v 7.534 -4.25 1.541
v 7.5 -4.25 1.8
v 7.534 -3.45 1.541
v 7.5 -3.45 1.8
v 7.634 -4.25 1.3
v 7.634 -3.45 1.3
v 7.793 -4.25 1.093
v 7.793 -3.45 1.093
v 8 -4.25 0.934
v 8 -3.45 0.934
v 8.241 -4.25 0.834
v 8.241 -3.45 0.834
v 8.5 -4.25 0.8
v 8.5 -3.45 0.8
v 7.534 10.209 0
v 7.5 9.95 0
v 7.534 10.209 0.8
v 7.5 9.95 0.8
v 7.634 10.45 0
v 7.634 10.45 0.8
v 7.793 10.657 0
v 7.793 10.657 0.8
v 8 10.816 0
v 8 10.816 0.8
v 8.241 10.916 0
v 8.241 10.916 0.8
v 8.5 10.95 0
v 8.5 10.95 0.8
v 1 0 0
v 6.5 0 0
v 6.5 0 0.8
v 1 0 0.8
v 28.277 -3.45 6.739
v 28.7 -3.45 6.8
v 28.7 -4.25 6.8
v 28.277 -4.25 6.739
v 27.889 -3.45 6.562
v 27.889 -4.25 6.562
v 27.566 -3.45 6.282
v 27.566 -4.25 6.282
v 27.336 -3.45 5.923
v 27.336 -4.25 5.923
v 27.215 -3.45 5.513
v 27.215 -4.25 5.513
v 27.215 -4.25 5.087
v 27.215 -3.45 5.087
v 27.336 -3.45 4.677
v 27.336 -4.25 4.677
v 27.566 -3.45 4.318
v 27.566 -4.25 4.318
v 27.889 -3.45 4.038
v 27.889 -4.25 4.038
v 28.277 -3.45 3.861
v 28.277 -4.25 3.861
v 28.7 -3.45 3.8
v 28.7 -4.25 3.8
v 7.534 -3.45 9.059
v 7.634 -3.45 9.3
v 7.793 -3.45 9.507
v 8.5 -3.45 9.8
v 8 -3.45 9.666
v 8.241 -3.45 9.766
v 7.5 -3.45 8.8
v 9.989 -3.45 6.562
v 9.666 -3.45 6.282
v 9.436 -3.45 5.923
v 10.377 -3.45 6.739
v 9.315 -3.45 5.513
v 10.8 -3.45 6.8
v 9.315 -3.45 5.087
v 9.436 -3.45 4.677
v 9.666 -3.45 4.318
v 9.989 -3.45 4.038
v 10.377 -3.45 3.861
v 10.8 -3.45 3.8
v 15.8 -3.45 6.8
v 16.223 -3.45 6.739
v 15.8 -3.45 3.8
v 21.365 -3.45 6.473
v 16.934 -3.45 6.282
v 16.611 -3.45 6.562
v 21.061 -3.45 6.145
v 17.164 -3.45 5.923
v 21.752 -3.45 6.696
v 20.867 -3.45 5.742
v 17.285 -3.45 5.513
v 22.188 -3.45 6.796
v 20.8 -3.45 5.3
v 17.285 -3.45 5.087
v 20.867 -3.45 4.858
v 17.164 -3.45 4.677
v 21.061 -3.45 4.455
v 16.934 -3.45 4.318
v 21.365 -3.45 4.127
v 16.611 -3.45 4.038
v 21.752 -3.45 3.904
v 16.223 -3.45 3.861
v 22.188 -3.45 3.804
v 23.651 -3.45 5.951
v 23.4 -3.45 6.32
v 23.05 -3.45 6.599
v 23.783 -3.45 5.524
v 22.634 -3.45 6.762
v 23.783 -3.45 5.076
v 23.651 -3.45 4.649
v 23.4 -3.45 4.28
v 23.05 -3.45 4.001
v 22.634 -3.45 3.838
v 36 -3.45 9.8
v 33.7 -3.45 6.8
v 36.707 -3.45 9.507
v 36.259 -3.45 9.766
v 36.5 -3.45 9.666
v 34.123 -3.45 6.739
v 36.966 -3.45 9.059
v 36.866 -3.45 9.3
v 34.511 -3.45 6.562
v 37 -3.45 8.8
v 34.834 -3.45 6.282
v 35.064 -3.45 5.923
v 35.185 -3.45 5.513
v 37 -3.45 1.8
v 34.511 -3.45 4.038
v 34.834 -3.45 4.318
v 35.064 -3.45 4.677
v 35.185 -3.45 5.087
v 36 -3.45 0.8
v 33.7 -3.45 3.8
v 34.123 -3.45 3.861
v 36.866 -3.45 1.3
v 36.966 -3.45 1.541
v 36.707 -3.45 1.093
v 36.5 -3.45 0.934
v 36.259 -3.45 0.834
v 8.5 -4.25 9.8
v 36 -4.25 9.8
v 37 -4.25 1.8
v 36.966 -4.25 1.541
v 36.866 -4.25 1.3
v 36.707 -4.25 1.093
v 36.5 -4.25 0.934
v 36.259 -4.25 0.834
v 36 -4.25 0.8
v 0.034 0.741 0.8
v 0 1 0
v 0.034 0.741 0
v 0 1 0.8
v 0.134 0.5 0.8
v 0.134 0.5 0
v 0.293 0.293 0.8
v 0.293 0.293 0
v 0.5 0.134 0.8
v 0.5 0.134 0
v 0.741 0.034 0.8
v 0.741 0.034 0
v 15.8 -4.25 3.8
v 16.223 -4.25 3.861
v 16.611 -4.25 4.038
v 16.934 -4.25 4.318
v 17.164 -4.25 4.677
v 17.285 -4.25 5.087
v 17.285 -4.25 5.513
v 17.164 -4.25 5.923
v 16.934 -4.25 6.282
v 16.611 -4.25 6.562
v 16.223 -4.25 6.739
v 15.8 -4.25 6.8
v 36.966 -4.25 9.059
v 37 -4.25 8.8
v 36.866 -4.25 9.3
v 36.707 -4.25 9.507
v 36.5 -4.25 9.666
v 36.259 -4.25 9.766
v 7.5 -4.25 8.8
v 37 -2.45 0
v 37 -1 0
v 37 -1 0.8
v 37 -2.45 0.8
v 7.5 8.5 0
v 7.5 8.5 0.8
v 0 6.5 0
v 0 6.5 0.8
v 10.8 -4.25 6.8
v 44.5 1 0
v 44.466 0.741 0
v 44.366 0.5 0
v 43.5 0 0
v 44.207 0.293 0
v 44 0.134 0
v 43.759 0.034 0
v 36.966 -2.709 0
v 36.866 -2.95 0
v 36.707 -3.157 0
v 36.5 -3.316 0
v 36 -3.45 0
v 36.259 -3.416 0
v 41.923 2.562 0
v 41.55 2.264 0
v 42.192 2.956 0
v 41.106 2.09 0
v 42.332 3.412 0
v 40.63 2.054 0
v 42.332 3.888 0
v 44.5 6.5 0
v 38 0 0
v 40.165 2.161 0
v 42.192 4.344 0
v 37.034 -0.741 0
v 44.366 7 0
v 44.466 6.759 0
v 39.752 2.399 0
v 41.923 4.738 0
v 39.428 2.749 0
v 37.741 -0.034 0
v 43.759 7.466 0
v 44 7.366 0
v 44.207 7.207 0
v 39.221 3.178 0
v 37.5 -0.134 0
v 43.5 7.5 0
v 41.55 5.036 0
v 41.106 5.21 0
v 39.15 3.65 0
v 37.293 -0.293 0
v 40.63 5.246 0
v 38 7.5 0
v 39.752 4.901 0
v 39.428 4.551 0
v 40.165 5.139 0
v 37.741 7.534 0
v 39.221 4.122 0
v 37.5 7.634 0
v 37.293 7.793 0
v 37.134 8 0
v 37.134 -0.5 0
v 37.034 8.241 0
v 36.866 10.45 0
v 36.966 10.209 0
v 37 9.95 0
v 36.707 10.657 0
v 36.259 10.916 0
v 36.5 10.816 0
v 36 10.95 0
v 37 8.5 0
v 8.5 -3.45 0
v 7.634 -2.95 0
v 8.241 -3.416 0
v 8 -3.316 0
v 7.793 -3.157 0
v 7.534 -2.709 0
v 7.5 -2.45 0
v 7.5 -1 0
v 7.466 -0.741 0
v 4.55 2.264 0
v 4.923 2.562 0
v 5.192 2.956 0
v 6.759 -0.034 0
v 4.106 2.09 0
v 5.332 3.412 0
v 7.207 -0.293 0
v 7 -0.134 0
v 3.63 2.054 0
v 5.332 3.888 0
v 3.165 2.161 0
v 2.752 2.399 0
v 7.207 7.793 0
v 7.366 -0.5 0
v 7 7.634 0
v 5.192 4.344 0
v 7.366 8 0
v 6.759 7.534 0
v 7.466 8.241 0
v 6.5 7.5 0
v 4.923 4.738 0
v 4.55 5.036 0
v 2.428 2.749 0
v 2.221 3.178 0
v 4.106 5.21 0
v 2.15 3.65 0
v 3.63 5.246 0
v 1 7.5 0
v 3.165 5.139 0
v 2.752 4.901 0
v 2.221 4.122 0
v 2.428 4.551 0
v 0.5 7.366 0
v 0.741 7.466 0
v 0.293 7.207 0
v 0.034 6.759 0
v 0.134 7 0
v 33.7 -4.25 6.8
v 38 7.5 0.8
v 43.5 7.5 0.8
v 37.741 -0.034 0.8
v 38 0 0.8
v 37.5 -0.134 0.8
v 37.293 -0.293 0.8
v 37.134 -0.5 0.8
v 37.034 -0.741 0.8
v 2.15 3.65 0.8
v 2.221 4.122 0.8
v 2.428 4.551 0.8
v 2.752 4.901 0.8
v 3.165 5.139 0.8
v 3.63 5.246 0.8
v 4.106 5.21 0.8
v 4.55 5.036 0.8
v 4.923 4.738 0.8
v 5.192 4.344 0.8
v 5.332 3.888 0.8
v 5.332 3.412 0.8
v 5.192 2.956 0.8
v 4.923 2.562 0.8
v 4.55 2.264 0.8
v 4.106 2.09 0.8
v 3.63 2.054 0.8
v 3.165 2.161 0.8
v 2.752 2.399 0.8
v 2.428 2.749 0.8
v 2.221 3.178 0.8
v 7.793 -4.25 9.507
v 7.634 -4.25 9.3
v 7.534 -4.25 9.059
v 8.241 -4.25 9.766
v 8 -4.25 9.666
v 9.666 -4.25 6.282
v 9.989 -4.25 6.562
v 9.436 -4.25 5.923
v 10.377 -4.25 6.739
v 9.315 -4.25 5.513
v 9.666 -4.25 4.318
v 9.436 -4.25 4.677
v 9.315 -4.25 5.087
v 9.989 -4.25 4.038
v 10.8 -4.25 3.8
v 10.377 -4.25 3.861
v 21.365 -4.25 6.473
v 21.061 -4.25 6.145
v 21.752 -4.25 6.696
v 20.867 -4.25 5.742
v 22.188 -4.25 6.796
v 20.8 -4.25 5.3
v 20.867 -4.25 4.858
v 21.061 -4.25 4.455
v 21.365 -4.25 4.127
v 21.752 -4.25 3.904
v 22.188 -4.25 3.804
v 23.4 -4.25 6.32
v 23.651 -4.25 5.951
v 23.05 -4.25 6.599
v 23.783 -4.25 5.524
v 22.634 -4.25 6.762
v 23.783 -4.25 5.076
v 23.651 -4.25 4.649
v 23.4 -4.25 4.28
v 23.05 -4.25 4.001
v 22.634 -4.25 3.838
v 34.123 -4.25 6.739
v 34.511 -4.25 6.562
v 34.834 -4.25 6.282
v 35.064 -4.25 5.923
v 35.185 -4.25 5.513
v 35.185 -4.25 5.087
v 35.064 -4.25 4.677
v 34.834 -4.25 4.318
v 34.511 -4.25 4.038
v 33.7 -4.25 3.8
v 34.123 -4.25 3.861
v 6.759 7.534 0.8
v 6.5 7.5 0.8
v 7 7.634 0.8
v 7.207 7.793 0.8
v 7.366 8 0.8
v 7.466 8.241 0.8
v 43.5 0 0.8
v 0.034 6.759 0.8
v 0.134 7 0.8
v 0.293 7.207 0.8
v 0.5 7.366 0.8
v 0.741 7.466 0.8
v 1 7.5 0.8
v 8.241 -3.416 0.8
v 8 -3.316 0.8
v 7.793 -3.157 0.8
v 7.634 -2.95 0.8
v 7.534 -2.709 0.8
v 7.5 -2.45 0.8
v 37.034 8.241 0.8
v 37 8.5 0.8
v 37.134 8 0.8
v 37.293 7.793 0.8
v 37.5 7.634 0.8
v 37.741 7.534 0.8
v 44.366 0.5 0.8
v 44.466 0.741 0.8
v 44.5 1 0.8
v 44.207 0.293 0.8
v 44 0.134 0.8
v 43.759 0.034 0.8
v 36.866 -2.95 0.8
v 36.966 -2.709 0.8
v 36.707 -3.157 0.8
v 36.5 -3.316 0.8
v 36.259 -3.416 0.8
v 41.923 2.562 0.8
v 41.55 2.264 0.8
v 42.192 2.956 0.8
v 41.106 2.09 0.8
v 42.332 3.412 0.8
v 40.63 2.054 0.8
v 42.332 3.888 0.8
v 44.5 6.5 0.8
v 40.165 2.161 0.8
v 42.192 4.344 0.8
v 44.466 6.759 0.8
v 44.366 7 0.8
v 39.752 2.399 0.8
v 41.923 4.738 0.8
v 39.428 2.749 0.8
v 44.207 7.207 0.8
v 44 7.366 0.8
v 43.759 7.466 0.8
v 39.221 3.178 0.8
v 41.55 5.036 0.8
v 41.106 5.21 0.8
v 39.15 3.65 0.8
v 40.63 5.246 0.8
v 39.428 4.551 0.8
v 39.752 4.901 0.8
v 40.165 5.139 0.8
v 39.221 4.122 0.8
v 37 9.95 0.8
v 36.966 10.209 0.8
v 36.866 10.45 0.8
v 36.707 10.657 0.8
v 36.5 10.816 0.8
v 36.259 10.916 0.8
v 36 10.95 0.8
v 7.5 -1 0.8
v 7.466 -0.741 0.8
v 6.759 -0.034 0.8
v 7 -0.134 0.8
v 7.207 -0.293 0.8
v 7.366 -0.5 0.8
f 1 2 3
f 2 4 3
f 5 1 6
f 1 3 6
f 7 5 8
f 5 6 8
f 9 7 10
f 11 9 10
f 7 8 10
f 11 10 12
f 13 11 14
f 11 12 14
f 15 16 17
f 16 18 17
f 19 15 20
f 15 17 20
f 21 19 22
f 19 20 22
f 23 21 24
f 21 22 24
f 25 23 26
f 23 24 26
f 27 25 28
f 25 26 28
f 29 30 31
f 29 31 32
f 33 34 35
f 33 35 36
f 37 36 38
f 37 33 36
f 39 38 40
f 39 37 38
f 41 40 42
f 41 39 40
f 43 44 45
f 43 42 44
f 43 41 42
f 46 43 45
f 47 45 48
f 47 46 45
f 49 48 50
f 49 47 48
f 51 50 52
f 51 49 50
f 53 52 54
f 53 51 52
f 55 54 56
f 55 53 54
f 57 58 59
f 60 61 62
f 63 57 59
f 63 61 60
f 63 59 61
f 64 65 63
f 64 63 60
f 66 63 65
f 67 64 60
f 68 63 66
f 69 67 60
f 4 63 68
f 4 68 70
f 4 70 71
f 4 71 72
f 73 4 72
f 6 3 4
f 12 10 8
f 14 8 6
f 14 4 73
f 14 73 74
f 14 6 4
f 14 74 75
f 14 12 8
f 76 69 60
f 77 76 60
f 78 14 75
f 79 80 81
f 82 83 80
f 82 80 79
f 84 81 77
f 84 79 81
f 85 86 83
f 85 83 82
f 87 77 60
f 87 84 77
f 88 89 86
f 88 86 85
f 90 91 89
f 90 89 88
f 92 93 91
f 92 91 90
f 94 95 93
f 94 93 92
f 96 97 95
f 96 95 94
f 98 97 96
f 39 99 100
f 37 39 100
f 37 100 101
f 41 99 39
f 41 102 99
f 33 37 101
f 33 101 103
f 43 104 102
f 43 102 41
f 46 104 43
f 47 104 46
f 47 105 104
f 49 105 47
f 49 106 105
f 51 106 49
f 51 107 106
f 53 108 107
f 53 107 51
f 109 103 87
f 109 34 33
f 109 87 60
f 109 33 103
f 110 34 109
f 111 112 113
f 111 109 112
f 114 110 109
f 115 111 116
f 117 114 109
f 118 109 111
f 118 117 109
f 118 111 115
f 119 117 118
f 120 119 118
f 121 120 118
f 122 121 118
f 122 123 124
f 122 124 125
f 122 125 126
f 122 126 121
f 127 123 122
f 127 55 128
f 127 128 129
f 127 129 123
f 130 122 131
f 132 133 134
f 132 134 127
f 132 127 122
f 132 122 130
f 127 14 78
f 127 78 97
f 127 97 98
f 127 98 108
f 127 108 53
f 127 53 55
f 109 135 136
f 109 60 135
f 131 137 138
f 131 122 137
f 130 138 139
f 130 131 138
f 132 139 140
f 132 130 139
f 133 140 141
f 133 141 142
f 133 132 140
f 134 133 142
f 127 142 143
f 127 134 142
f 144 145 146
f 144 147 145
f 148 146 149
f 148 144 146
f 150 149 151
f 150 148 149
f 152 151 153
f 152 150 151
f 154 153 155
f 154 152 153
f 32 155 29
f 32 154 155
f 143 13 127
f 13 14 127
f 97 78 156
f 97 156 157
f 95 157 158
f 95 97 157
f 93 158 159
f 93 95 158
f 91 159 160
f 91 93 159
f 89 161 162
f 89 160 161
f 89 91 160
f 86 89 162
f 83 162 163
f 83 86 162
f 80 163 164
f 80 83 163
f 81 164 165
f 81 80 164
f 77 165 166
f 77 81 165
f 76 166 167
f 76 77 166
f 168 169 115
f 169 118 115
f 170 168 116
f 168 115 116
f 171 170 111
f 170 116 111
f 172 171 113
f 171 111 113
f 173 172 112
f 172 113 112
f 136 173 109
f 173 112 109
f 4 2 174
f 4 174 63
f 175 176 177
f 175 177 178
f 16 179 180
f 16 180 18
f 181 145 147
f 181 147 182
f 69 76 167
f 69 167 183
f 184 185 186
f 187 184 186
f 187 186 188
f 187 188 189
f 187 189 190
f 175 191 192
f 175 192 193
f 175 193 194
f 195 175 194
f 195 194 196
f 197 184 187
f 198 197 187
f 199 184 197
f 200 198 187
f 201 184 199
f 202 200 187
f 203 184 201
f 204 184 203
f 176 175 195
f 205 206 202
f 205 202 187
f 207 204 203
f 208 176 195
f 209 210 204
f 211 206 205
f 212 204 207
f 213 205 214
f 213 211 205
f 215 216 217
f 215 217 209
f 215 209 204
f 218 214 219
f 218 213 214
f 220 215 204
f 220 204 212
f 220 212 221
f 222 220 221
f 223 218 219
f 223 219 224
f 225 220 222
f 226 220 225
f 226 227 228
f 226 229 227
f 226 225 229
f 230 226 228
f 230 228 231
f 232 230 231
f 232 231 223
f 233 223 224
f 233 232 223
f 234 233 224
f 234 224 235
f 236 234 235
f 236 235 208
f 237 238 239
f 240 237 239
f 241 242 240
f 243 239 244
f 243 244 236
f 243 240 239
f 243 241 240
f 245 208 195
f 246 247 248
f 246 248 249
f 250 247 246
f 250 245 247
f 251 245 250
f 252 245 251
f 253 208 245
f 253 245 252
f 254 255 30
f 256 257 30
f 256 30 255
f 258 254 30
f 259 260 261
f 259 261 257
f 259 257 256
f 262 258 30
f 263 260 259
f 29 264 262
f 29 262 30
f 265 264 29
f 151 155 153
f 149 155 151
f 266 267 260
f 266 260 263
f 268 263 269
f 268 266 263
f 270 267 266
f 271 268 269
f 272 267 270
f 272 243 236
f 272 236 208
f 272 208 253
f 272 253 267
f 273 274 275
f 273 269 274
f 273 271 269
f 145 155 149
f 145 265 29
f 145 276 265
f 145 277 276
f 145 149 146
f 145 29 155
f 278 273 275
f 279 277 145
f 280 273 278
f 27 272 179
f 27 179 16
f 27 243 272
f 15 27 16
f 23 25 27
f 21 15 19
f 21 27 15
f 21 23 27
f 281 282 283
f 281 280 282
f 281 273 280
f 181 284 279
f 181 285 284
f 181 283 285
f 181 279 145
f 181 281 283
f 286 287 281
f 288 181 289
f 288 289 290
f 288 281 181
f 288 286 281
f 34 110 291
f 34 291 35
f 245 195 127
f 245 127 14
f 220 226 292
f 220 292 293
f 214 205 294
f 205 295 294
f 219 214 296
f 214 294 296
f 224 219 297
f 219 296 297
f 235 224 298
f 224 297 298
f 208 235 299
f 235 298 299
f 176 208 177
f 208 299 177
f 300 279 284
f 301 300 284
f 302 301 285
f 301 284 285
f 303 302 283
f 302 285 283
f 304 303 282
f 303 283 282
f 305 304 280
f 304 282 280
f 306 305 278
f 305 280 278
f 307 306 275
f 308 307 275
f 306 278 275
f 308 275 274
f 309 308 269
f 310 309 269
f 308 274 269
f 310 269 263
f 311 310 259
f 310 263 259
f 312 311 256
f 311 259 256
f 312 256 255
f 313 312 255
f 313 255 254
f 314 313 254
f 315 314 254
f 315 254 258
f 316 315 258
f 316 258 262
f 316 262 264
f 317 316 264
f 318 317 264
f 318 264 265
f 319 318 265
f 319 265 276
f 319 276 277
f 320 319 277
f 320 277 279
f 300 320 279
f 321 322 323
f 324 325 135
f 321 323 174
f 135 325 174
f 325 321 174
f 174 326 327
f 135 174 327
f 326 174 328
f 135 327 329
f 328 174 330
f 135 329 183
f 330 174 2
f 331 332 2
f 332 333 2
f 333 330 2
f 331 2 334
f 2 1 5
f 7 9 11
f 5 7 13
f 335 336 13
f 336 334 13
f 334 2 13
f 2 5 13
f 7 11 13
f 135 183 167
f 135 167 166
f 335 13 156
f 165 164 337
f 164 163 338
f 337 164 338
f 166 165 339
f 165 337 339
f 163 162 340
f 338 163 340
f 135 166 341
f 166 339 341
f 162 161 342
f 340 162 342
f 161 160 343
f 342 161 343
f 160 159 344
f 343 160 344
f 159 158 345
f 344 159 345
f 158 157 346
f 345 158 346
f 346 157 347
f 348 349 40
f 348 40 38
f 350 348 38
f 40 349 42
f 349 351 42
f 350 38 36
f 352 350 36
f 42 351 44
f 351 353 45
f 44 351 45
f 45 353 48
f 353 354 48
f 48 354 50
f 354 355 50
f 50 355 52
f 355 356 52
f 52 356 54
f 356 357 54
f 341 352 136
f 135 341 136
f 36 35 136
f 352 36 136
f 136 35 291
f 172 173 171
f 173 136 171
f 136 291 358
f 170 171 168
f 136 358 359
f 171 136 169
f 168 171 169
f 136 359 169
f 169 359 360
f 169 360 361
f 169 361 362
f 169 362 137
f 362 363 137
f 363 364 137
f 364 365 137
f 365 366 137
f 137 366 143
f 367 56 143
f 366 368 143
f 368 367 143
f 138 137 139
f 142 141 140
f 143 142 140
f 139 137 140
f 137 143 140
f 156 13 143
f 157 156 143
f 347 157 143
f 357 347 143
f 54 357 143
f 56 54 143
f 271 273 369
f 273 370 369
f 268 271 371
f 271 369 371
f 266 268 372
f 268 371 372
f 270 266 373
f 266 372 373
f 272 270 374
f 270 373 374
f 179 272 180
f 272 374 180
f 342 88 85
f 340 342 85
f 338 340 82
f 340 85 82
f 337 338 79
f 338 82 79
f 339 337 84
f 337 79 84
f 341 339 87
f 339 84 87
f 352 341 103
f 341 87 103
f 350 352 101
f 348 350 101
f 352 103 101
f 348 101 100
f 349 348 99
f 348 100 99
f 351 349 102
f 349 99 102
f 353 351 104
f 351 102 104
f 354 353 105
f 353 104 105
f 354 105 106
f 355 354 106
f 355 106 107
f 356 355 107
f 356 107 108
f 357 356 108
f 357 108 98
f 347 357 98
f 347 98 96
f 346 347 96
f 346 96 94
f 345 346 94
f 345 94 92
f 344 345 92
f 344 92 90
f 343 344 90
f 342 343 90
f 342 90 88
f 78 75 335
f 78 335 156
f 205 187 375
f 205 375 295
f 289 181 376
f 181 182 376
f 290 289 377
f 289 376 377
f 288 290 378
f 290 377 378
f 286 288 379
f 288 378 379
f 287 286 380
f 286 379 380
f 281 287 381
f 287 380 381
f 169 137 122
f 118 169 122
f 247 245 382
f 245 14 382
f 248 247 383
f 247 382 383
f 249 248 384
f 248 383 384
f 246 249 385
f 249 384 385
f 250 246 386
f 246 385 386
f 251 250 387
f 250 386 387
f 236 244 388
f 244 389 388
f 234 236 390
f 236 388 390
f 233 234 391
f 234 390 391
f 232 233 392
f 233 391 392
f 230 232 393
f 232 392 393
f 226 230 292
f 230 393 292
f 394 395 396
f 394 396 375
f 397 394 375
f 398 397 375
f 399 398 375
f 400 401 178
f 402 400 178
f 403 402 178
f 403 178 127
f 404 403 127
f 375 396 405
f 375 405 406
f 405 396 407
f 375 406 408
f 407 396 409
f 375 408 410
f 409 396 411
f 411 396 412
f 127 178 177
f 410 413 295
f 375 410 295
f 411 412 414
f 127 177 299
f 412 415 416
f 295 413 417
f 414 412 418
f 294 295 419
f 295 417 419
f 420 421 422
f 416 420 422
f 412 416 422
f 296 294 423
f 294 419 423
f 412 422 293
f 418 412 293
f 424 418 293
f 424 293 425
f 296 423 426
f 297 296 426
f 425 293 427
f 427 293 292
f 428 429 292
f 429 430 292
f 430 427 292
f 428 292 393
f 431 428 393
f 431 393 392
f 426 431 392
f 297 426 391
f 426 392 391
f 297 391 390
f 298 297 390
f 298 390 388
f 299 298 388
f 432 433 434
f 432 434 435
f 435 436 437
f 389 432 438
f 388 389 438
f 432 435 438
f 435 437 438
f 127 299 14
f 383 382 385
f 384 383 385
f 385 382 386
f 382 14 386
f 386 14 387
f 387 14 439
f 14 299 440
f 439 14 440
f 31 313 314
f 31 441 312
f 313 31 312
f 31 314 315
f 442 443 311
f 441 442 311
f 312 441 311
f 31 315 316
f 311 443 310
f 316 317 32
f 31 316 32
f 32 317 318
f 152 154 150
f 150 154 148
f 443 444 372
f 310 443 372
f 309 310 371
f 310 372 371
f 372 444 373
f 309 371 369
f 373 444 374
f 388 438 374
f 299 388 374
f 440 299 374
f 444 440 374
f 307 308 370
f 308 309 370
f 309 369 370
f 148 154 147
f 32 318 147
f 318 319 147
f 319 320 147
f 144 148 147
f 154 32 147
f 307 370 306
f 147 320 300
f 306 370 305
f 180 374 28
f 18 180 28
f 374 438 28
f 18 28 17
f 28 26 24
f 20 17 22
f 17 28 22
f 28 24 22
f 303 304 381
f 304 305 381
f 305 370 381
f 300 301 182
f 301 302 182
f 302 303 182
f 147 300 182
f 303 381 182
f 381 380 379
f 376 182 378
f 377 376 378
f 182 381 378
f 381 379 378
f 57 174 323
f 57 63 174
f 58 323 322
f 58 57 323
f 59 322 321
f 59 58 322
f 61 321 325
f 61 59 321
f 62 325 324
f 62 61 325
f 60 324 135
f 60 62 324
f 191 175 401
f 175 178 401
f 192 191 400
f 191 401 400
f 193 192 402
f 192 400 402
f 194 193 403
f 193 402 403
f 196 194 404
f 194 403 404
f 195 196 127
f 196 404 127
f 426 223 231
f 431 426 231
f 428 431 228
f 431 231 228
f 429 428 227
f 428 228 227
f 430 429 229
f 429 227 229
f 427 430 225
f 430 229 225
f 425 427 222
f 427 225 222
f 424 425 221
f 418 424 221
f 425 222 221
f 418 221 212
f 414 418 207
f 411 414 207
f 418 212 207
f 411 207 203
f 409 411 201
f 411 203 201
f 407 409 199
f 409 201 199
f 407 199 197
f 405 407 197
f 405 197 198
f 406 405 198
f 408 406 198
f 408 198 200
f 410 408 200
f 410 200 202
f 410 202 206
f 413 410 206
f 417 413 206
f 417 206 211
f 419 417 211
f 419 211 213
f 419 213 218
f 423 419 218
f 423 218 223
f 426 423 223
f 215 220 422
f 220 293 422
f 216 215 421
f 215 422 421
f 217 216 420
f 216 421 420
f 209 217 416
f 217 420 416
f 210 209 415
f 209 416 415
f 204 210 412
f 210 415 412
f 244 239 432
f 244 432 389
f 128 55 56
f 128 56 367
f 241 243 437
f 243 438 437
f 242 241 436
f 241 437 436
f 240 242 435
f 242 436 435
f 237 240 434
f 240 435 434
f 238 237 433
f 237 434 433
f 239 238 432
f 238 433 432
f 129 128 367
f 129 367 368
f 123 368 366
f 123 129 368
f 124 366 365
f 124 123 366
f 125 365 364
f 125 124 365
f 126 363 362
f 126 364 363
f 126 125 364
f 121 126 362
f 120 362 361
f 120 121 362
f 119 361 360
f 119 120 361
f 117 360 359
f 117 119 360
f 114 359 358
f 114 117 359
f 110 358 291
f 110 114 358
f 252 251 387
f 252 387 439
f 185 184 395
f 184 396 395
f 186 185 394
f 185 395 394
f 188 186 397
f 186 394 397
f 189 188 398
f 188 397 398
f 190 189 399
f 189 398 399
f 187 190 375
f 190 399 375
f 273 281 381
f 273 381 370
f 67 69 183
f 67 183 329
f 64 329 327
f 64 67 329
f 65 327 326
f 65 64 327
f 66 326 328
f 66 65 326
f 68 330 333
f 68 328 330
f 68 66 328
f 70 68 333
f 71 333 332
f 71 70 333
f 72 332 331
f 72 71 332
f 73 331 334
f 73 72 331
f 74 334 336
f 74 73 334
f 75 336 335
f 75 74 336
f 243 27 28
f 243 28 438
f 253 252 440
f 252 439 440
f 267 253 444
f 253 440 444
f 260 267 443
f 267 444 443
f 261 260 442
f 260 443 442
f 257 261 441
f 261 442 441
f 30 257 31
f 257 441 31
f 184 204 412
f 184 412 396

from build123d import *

# Parameters (mm, degrees)
BOSS_EXTRU_1_DEPTH                  = 0.8
CONG_2_R                            = 1
DIAM_TRE_DU_PER_AGE_3_2_3_2_1_D     = 3.2
DIAM_TRE_DU_PER_AGE_3_2_3_2_1_DEPTH = 8
DIAM_TRE_DU_PER_AGE_3_2_3_2_1_TIP   = 0.96137699
ESQUISSE4_W                         = 29.5
ESQUISSE4_H                         = 0.8
BOSS_EXTRU_2_DEPTH                  = 9
CONG_3_R                            = 1
ESQUISSE5_R                         = 1.5
ENL_V_MAT_EXTRU_1_DEPTH             = 9


with BuildPart() as part:
    # Esquisse1 → Boss.-Extru.1 (new body)
    with BuildSketch(Plane.XY):
        Polygon((0, 0), (0, 7.5), (7.5, 7.5), (7.5, 10.95), (37, 10.95), (37, 7.5), (44.5, 7.5), (44.5, 0), (37, 0), (37, -3.45), (7.5, -3.45), (7.5, 0), align=None)
    extrude(amount=BOSS_EXTRU_1_DEPTH)

    # Congé2
    cong_2_edges = [part.edges().sort_by_distance(p)[0] for p in [
        (0, 0, 0.4),
        (0, 7.5, 0.4),
        (7.5, 7.5, 0.4),
        (7.5, 10.95, 0.4),
        (37, 10.95, 0.4),
        (37, 7.5, 0.4),
        (44.5, 7.5, 0.4),
        (44.5, 0, 0.4),
        (37, 0, 0.4),
        (37, -3.45, 0.4),
        (7.5, -3.45, 0.4),
        (7.5, 0, 0.4),
    ]]
    fillet(cong_2_edges, radius=CONG_2_R)

    # Diamètre du perçage Ø3.2 (3.2)1
    with Locations(Plane.XY.offset(0.8)):
        with Locations((3.75, 3.65), (40.75, 3.65)):
            Hole(DIAM_TRE_DU_PER_AGE_3_2_3_2_1_D / 2, depth=DIAM_TRE_DU_PER_AGE_3_2_3_2_1_DEPTH)
            with Locations((0, 0, -(DIAM_TRE_DU_PER_AGE_3_2_3_2_1_DEPTH + DIAM_TRE_DU_PER_AGE_3_2_3_2_1_TIP / 2))):  # 118° drill point
                Cone(0, DIAM_TRE_DU_PER_AGE_3_2_3_2_1_D / 2, DIAM_TRE_DU_PER_AGE_3_2_3_2_1_TIP, mode=Mode.SUBTRACT)


with BuildPart() as body_2:
    # Esquisse4 → Boss.-Extru.2 (new body)
    with BuildSketch(Plane.XY.offset(0.8)):
        with Locations((22.25, -3.85)):
            Rectangle(ESQUISSE4_W, ESQUISSE4_H)
    extrude(amount=BOSS_EXTRU_2_DEPTH)

    # Congé3
    cong_3_edges = [body_2.edges().sort_by_distance(p)[0] for p in [
        (37, -3.85, 9.8),
        (7.5, -3.85, 9.8),
        (37, -3.85, 0.8),
        (7.5, -3.85, 0.8),
    ]]
    fillet(cong_3_edges, radius=CONG_3_R)

    # Esquisse5 → Enlèv. mat.-Extru.1 (cut)
    with BuildSketch(Plane(origin=(0, -3.45, 0), x_dir=(1, 0, 0), z_dir=(0, 1, 0))):
        with Locations(Location((22.3, -5.3, 0), (0, 0, 180))):
            Circle(ESQUISSE5_R)
        with BuildLine():
            Line((10.8, -3.8), (15.8, -3.8))
            ThreePointArc((15.8, -3.8), (17.3, -5.3), (15.8, -6.8))
            Line((15.8, -6.8), (10.8, -6.8))
            ThreePointArc((10.8, -6.8), (9.3, -5.3), (10.8, -3.8))
        make_face()
        with BuildLine():
            Line((28.7, -3.8), (33.7, -3.8))
            ThreePointArc((33.7, -3.8), (35.2, -5.3), (33.7, -6.8))
            Line((33.7, -6.8), (28.7, -6.8))
            ThreePointArc((28.7, -6.8), (27.2, -5.3), (28.7, -3.8))
        make_face()
    extrude(amount=-ENL_V_MAT_EXTRU_1_DEPTH, mode=Mode.SUBTRACT)


solid = Compound([part.part, body_2.part])
